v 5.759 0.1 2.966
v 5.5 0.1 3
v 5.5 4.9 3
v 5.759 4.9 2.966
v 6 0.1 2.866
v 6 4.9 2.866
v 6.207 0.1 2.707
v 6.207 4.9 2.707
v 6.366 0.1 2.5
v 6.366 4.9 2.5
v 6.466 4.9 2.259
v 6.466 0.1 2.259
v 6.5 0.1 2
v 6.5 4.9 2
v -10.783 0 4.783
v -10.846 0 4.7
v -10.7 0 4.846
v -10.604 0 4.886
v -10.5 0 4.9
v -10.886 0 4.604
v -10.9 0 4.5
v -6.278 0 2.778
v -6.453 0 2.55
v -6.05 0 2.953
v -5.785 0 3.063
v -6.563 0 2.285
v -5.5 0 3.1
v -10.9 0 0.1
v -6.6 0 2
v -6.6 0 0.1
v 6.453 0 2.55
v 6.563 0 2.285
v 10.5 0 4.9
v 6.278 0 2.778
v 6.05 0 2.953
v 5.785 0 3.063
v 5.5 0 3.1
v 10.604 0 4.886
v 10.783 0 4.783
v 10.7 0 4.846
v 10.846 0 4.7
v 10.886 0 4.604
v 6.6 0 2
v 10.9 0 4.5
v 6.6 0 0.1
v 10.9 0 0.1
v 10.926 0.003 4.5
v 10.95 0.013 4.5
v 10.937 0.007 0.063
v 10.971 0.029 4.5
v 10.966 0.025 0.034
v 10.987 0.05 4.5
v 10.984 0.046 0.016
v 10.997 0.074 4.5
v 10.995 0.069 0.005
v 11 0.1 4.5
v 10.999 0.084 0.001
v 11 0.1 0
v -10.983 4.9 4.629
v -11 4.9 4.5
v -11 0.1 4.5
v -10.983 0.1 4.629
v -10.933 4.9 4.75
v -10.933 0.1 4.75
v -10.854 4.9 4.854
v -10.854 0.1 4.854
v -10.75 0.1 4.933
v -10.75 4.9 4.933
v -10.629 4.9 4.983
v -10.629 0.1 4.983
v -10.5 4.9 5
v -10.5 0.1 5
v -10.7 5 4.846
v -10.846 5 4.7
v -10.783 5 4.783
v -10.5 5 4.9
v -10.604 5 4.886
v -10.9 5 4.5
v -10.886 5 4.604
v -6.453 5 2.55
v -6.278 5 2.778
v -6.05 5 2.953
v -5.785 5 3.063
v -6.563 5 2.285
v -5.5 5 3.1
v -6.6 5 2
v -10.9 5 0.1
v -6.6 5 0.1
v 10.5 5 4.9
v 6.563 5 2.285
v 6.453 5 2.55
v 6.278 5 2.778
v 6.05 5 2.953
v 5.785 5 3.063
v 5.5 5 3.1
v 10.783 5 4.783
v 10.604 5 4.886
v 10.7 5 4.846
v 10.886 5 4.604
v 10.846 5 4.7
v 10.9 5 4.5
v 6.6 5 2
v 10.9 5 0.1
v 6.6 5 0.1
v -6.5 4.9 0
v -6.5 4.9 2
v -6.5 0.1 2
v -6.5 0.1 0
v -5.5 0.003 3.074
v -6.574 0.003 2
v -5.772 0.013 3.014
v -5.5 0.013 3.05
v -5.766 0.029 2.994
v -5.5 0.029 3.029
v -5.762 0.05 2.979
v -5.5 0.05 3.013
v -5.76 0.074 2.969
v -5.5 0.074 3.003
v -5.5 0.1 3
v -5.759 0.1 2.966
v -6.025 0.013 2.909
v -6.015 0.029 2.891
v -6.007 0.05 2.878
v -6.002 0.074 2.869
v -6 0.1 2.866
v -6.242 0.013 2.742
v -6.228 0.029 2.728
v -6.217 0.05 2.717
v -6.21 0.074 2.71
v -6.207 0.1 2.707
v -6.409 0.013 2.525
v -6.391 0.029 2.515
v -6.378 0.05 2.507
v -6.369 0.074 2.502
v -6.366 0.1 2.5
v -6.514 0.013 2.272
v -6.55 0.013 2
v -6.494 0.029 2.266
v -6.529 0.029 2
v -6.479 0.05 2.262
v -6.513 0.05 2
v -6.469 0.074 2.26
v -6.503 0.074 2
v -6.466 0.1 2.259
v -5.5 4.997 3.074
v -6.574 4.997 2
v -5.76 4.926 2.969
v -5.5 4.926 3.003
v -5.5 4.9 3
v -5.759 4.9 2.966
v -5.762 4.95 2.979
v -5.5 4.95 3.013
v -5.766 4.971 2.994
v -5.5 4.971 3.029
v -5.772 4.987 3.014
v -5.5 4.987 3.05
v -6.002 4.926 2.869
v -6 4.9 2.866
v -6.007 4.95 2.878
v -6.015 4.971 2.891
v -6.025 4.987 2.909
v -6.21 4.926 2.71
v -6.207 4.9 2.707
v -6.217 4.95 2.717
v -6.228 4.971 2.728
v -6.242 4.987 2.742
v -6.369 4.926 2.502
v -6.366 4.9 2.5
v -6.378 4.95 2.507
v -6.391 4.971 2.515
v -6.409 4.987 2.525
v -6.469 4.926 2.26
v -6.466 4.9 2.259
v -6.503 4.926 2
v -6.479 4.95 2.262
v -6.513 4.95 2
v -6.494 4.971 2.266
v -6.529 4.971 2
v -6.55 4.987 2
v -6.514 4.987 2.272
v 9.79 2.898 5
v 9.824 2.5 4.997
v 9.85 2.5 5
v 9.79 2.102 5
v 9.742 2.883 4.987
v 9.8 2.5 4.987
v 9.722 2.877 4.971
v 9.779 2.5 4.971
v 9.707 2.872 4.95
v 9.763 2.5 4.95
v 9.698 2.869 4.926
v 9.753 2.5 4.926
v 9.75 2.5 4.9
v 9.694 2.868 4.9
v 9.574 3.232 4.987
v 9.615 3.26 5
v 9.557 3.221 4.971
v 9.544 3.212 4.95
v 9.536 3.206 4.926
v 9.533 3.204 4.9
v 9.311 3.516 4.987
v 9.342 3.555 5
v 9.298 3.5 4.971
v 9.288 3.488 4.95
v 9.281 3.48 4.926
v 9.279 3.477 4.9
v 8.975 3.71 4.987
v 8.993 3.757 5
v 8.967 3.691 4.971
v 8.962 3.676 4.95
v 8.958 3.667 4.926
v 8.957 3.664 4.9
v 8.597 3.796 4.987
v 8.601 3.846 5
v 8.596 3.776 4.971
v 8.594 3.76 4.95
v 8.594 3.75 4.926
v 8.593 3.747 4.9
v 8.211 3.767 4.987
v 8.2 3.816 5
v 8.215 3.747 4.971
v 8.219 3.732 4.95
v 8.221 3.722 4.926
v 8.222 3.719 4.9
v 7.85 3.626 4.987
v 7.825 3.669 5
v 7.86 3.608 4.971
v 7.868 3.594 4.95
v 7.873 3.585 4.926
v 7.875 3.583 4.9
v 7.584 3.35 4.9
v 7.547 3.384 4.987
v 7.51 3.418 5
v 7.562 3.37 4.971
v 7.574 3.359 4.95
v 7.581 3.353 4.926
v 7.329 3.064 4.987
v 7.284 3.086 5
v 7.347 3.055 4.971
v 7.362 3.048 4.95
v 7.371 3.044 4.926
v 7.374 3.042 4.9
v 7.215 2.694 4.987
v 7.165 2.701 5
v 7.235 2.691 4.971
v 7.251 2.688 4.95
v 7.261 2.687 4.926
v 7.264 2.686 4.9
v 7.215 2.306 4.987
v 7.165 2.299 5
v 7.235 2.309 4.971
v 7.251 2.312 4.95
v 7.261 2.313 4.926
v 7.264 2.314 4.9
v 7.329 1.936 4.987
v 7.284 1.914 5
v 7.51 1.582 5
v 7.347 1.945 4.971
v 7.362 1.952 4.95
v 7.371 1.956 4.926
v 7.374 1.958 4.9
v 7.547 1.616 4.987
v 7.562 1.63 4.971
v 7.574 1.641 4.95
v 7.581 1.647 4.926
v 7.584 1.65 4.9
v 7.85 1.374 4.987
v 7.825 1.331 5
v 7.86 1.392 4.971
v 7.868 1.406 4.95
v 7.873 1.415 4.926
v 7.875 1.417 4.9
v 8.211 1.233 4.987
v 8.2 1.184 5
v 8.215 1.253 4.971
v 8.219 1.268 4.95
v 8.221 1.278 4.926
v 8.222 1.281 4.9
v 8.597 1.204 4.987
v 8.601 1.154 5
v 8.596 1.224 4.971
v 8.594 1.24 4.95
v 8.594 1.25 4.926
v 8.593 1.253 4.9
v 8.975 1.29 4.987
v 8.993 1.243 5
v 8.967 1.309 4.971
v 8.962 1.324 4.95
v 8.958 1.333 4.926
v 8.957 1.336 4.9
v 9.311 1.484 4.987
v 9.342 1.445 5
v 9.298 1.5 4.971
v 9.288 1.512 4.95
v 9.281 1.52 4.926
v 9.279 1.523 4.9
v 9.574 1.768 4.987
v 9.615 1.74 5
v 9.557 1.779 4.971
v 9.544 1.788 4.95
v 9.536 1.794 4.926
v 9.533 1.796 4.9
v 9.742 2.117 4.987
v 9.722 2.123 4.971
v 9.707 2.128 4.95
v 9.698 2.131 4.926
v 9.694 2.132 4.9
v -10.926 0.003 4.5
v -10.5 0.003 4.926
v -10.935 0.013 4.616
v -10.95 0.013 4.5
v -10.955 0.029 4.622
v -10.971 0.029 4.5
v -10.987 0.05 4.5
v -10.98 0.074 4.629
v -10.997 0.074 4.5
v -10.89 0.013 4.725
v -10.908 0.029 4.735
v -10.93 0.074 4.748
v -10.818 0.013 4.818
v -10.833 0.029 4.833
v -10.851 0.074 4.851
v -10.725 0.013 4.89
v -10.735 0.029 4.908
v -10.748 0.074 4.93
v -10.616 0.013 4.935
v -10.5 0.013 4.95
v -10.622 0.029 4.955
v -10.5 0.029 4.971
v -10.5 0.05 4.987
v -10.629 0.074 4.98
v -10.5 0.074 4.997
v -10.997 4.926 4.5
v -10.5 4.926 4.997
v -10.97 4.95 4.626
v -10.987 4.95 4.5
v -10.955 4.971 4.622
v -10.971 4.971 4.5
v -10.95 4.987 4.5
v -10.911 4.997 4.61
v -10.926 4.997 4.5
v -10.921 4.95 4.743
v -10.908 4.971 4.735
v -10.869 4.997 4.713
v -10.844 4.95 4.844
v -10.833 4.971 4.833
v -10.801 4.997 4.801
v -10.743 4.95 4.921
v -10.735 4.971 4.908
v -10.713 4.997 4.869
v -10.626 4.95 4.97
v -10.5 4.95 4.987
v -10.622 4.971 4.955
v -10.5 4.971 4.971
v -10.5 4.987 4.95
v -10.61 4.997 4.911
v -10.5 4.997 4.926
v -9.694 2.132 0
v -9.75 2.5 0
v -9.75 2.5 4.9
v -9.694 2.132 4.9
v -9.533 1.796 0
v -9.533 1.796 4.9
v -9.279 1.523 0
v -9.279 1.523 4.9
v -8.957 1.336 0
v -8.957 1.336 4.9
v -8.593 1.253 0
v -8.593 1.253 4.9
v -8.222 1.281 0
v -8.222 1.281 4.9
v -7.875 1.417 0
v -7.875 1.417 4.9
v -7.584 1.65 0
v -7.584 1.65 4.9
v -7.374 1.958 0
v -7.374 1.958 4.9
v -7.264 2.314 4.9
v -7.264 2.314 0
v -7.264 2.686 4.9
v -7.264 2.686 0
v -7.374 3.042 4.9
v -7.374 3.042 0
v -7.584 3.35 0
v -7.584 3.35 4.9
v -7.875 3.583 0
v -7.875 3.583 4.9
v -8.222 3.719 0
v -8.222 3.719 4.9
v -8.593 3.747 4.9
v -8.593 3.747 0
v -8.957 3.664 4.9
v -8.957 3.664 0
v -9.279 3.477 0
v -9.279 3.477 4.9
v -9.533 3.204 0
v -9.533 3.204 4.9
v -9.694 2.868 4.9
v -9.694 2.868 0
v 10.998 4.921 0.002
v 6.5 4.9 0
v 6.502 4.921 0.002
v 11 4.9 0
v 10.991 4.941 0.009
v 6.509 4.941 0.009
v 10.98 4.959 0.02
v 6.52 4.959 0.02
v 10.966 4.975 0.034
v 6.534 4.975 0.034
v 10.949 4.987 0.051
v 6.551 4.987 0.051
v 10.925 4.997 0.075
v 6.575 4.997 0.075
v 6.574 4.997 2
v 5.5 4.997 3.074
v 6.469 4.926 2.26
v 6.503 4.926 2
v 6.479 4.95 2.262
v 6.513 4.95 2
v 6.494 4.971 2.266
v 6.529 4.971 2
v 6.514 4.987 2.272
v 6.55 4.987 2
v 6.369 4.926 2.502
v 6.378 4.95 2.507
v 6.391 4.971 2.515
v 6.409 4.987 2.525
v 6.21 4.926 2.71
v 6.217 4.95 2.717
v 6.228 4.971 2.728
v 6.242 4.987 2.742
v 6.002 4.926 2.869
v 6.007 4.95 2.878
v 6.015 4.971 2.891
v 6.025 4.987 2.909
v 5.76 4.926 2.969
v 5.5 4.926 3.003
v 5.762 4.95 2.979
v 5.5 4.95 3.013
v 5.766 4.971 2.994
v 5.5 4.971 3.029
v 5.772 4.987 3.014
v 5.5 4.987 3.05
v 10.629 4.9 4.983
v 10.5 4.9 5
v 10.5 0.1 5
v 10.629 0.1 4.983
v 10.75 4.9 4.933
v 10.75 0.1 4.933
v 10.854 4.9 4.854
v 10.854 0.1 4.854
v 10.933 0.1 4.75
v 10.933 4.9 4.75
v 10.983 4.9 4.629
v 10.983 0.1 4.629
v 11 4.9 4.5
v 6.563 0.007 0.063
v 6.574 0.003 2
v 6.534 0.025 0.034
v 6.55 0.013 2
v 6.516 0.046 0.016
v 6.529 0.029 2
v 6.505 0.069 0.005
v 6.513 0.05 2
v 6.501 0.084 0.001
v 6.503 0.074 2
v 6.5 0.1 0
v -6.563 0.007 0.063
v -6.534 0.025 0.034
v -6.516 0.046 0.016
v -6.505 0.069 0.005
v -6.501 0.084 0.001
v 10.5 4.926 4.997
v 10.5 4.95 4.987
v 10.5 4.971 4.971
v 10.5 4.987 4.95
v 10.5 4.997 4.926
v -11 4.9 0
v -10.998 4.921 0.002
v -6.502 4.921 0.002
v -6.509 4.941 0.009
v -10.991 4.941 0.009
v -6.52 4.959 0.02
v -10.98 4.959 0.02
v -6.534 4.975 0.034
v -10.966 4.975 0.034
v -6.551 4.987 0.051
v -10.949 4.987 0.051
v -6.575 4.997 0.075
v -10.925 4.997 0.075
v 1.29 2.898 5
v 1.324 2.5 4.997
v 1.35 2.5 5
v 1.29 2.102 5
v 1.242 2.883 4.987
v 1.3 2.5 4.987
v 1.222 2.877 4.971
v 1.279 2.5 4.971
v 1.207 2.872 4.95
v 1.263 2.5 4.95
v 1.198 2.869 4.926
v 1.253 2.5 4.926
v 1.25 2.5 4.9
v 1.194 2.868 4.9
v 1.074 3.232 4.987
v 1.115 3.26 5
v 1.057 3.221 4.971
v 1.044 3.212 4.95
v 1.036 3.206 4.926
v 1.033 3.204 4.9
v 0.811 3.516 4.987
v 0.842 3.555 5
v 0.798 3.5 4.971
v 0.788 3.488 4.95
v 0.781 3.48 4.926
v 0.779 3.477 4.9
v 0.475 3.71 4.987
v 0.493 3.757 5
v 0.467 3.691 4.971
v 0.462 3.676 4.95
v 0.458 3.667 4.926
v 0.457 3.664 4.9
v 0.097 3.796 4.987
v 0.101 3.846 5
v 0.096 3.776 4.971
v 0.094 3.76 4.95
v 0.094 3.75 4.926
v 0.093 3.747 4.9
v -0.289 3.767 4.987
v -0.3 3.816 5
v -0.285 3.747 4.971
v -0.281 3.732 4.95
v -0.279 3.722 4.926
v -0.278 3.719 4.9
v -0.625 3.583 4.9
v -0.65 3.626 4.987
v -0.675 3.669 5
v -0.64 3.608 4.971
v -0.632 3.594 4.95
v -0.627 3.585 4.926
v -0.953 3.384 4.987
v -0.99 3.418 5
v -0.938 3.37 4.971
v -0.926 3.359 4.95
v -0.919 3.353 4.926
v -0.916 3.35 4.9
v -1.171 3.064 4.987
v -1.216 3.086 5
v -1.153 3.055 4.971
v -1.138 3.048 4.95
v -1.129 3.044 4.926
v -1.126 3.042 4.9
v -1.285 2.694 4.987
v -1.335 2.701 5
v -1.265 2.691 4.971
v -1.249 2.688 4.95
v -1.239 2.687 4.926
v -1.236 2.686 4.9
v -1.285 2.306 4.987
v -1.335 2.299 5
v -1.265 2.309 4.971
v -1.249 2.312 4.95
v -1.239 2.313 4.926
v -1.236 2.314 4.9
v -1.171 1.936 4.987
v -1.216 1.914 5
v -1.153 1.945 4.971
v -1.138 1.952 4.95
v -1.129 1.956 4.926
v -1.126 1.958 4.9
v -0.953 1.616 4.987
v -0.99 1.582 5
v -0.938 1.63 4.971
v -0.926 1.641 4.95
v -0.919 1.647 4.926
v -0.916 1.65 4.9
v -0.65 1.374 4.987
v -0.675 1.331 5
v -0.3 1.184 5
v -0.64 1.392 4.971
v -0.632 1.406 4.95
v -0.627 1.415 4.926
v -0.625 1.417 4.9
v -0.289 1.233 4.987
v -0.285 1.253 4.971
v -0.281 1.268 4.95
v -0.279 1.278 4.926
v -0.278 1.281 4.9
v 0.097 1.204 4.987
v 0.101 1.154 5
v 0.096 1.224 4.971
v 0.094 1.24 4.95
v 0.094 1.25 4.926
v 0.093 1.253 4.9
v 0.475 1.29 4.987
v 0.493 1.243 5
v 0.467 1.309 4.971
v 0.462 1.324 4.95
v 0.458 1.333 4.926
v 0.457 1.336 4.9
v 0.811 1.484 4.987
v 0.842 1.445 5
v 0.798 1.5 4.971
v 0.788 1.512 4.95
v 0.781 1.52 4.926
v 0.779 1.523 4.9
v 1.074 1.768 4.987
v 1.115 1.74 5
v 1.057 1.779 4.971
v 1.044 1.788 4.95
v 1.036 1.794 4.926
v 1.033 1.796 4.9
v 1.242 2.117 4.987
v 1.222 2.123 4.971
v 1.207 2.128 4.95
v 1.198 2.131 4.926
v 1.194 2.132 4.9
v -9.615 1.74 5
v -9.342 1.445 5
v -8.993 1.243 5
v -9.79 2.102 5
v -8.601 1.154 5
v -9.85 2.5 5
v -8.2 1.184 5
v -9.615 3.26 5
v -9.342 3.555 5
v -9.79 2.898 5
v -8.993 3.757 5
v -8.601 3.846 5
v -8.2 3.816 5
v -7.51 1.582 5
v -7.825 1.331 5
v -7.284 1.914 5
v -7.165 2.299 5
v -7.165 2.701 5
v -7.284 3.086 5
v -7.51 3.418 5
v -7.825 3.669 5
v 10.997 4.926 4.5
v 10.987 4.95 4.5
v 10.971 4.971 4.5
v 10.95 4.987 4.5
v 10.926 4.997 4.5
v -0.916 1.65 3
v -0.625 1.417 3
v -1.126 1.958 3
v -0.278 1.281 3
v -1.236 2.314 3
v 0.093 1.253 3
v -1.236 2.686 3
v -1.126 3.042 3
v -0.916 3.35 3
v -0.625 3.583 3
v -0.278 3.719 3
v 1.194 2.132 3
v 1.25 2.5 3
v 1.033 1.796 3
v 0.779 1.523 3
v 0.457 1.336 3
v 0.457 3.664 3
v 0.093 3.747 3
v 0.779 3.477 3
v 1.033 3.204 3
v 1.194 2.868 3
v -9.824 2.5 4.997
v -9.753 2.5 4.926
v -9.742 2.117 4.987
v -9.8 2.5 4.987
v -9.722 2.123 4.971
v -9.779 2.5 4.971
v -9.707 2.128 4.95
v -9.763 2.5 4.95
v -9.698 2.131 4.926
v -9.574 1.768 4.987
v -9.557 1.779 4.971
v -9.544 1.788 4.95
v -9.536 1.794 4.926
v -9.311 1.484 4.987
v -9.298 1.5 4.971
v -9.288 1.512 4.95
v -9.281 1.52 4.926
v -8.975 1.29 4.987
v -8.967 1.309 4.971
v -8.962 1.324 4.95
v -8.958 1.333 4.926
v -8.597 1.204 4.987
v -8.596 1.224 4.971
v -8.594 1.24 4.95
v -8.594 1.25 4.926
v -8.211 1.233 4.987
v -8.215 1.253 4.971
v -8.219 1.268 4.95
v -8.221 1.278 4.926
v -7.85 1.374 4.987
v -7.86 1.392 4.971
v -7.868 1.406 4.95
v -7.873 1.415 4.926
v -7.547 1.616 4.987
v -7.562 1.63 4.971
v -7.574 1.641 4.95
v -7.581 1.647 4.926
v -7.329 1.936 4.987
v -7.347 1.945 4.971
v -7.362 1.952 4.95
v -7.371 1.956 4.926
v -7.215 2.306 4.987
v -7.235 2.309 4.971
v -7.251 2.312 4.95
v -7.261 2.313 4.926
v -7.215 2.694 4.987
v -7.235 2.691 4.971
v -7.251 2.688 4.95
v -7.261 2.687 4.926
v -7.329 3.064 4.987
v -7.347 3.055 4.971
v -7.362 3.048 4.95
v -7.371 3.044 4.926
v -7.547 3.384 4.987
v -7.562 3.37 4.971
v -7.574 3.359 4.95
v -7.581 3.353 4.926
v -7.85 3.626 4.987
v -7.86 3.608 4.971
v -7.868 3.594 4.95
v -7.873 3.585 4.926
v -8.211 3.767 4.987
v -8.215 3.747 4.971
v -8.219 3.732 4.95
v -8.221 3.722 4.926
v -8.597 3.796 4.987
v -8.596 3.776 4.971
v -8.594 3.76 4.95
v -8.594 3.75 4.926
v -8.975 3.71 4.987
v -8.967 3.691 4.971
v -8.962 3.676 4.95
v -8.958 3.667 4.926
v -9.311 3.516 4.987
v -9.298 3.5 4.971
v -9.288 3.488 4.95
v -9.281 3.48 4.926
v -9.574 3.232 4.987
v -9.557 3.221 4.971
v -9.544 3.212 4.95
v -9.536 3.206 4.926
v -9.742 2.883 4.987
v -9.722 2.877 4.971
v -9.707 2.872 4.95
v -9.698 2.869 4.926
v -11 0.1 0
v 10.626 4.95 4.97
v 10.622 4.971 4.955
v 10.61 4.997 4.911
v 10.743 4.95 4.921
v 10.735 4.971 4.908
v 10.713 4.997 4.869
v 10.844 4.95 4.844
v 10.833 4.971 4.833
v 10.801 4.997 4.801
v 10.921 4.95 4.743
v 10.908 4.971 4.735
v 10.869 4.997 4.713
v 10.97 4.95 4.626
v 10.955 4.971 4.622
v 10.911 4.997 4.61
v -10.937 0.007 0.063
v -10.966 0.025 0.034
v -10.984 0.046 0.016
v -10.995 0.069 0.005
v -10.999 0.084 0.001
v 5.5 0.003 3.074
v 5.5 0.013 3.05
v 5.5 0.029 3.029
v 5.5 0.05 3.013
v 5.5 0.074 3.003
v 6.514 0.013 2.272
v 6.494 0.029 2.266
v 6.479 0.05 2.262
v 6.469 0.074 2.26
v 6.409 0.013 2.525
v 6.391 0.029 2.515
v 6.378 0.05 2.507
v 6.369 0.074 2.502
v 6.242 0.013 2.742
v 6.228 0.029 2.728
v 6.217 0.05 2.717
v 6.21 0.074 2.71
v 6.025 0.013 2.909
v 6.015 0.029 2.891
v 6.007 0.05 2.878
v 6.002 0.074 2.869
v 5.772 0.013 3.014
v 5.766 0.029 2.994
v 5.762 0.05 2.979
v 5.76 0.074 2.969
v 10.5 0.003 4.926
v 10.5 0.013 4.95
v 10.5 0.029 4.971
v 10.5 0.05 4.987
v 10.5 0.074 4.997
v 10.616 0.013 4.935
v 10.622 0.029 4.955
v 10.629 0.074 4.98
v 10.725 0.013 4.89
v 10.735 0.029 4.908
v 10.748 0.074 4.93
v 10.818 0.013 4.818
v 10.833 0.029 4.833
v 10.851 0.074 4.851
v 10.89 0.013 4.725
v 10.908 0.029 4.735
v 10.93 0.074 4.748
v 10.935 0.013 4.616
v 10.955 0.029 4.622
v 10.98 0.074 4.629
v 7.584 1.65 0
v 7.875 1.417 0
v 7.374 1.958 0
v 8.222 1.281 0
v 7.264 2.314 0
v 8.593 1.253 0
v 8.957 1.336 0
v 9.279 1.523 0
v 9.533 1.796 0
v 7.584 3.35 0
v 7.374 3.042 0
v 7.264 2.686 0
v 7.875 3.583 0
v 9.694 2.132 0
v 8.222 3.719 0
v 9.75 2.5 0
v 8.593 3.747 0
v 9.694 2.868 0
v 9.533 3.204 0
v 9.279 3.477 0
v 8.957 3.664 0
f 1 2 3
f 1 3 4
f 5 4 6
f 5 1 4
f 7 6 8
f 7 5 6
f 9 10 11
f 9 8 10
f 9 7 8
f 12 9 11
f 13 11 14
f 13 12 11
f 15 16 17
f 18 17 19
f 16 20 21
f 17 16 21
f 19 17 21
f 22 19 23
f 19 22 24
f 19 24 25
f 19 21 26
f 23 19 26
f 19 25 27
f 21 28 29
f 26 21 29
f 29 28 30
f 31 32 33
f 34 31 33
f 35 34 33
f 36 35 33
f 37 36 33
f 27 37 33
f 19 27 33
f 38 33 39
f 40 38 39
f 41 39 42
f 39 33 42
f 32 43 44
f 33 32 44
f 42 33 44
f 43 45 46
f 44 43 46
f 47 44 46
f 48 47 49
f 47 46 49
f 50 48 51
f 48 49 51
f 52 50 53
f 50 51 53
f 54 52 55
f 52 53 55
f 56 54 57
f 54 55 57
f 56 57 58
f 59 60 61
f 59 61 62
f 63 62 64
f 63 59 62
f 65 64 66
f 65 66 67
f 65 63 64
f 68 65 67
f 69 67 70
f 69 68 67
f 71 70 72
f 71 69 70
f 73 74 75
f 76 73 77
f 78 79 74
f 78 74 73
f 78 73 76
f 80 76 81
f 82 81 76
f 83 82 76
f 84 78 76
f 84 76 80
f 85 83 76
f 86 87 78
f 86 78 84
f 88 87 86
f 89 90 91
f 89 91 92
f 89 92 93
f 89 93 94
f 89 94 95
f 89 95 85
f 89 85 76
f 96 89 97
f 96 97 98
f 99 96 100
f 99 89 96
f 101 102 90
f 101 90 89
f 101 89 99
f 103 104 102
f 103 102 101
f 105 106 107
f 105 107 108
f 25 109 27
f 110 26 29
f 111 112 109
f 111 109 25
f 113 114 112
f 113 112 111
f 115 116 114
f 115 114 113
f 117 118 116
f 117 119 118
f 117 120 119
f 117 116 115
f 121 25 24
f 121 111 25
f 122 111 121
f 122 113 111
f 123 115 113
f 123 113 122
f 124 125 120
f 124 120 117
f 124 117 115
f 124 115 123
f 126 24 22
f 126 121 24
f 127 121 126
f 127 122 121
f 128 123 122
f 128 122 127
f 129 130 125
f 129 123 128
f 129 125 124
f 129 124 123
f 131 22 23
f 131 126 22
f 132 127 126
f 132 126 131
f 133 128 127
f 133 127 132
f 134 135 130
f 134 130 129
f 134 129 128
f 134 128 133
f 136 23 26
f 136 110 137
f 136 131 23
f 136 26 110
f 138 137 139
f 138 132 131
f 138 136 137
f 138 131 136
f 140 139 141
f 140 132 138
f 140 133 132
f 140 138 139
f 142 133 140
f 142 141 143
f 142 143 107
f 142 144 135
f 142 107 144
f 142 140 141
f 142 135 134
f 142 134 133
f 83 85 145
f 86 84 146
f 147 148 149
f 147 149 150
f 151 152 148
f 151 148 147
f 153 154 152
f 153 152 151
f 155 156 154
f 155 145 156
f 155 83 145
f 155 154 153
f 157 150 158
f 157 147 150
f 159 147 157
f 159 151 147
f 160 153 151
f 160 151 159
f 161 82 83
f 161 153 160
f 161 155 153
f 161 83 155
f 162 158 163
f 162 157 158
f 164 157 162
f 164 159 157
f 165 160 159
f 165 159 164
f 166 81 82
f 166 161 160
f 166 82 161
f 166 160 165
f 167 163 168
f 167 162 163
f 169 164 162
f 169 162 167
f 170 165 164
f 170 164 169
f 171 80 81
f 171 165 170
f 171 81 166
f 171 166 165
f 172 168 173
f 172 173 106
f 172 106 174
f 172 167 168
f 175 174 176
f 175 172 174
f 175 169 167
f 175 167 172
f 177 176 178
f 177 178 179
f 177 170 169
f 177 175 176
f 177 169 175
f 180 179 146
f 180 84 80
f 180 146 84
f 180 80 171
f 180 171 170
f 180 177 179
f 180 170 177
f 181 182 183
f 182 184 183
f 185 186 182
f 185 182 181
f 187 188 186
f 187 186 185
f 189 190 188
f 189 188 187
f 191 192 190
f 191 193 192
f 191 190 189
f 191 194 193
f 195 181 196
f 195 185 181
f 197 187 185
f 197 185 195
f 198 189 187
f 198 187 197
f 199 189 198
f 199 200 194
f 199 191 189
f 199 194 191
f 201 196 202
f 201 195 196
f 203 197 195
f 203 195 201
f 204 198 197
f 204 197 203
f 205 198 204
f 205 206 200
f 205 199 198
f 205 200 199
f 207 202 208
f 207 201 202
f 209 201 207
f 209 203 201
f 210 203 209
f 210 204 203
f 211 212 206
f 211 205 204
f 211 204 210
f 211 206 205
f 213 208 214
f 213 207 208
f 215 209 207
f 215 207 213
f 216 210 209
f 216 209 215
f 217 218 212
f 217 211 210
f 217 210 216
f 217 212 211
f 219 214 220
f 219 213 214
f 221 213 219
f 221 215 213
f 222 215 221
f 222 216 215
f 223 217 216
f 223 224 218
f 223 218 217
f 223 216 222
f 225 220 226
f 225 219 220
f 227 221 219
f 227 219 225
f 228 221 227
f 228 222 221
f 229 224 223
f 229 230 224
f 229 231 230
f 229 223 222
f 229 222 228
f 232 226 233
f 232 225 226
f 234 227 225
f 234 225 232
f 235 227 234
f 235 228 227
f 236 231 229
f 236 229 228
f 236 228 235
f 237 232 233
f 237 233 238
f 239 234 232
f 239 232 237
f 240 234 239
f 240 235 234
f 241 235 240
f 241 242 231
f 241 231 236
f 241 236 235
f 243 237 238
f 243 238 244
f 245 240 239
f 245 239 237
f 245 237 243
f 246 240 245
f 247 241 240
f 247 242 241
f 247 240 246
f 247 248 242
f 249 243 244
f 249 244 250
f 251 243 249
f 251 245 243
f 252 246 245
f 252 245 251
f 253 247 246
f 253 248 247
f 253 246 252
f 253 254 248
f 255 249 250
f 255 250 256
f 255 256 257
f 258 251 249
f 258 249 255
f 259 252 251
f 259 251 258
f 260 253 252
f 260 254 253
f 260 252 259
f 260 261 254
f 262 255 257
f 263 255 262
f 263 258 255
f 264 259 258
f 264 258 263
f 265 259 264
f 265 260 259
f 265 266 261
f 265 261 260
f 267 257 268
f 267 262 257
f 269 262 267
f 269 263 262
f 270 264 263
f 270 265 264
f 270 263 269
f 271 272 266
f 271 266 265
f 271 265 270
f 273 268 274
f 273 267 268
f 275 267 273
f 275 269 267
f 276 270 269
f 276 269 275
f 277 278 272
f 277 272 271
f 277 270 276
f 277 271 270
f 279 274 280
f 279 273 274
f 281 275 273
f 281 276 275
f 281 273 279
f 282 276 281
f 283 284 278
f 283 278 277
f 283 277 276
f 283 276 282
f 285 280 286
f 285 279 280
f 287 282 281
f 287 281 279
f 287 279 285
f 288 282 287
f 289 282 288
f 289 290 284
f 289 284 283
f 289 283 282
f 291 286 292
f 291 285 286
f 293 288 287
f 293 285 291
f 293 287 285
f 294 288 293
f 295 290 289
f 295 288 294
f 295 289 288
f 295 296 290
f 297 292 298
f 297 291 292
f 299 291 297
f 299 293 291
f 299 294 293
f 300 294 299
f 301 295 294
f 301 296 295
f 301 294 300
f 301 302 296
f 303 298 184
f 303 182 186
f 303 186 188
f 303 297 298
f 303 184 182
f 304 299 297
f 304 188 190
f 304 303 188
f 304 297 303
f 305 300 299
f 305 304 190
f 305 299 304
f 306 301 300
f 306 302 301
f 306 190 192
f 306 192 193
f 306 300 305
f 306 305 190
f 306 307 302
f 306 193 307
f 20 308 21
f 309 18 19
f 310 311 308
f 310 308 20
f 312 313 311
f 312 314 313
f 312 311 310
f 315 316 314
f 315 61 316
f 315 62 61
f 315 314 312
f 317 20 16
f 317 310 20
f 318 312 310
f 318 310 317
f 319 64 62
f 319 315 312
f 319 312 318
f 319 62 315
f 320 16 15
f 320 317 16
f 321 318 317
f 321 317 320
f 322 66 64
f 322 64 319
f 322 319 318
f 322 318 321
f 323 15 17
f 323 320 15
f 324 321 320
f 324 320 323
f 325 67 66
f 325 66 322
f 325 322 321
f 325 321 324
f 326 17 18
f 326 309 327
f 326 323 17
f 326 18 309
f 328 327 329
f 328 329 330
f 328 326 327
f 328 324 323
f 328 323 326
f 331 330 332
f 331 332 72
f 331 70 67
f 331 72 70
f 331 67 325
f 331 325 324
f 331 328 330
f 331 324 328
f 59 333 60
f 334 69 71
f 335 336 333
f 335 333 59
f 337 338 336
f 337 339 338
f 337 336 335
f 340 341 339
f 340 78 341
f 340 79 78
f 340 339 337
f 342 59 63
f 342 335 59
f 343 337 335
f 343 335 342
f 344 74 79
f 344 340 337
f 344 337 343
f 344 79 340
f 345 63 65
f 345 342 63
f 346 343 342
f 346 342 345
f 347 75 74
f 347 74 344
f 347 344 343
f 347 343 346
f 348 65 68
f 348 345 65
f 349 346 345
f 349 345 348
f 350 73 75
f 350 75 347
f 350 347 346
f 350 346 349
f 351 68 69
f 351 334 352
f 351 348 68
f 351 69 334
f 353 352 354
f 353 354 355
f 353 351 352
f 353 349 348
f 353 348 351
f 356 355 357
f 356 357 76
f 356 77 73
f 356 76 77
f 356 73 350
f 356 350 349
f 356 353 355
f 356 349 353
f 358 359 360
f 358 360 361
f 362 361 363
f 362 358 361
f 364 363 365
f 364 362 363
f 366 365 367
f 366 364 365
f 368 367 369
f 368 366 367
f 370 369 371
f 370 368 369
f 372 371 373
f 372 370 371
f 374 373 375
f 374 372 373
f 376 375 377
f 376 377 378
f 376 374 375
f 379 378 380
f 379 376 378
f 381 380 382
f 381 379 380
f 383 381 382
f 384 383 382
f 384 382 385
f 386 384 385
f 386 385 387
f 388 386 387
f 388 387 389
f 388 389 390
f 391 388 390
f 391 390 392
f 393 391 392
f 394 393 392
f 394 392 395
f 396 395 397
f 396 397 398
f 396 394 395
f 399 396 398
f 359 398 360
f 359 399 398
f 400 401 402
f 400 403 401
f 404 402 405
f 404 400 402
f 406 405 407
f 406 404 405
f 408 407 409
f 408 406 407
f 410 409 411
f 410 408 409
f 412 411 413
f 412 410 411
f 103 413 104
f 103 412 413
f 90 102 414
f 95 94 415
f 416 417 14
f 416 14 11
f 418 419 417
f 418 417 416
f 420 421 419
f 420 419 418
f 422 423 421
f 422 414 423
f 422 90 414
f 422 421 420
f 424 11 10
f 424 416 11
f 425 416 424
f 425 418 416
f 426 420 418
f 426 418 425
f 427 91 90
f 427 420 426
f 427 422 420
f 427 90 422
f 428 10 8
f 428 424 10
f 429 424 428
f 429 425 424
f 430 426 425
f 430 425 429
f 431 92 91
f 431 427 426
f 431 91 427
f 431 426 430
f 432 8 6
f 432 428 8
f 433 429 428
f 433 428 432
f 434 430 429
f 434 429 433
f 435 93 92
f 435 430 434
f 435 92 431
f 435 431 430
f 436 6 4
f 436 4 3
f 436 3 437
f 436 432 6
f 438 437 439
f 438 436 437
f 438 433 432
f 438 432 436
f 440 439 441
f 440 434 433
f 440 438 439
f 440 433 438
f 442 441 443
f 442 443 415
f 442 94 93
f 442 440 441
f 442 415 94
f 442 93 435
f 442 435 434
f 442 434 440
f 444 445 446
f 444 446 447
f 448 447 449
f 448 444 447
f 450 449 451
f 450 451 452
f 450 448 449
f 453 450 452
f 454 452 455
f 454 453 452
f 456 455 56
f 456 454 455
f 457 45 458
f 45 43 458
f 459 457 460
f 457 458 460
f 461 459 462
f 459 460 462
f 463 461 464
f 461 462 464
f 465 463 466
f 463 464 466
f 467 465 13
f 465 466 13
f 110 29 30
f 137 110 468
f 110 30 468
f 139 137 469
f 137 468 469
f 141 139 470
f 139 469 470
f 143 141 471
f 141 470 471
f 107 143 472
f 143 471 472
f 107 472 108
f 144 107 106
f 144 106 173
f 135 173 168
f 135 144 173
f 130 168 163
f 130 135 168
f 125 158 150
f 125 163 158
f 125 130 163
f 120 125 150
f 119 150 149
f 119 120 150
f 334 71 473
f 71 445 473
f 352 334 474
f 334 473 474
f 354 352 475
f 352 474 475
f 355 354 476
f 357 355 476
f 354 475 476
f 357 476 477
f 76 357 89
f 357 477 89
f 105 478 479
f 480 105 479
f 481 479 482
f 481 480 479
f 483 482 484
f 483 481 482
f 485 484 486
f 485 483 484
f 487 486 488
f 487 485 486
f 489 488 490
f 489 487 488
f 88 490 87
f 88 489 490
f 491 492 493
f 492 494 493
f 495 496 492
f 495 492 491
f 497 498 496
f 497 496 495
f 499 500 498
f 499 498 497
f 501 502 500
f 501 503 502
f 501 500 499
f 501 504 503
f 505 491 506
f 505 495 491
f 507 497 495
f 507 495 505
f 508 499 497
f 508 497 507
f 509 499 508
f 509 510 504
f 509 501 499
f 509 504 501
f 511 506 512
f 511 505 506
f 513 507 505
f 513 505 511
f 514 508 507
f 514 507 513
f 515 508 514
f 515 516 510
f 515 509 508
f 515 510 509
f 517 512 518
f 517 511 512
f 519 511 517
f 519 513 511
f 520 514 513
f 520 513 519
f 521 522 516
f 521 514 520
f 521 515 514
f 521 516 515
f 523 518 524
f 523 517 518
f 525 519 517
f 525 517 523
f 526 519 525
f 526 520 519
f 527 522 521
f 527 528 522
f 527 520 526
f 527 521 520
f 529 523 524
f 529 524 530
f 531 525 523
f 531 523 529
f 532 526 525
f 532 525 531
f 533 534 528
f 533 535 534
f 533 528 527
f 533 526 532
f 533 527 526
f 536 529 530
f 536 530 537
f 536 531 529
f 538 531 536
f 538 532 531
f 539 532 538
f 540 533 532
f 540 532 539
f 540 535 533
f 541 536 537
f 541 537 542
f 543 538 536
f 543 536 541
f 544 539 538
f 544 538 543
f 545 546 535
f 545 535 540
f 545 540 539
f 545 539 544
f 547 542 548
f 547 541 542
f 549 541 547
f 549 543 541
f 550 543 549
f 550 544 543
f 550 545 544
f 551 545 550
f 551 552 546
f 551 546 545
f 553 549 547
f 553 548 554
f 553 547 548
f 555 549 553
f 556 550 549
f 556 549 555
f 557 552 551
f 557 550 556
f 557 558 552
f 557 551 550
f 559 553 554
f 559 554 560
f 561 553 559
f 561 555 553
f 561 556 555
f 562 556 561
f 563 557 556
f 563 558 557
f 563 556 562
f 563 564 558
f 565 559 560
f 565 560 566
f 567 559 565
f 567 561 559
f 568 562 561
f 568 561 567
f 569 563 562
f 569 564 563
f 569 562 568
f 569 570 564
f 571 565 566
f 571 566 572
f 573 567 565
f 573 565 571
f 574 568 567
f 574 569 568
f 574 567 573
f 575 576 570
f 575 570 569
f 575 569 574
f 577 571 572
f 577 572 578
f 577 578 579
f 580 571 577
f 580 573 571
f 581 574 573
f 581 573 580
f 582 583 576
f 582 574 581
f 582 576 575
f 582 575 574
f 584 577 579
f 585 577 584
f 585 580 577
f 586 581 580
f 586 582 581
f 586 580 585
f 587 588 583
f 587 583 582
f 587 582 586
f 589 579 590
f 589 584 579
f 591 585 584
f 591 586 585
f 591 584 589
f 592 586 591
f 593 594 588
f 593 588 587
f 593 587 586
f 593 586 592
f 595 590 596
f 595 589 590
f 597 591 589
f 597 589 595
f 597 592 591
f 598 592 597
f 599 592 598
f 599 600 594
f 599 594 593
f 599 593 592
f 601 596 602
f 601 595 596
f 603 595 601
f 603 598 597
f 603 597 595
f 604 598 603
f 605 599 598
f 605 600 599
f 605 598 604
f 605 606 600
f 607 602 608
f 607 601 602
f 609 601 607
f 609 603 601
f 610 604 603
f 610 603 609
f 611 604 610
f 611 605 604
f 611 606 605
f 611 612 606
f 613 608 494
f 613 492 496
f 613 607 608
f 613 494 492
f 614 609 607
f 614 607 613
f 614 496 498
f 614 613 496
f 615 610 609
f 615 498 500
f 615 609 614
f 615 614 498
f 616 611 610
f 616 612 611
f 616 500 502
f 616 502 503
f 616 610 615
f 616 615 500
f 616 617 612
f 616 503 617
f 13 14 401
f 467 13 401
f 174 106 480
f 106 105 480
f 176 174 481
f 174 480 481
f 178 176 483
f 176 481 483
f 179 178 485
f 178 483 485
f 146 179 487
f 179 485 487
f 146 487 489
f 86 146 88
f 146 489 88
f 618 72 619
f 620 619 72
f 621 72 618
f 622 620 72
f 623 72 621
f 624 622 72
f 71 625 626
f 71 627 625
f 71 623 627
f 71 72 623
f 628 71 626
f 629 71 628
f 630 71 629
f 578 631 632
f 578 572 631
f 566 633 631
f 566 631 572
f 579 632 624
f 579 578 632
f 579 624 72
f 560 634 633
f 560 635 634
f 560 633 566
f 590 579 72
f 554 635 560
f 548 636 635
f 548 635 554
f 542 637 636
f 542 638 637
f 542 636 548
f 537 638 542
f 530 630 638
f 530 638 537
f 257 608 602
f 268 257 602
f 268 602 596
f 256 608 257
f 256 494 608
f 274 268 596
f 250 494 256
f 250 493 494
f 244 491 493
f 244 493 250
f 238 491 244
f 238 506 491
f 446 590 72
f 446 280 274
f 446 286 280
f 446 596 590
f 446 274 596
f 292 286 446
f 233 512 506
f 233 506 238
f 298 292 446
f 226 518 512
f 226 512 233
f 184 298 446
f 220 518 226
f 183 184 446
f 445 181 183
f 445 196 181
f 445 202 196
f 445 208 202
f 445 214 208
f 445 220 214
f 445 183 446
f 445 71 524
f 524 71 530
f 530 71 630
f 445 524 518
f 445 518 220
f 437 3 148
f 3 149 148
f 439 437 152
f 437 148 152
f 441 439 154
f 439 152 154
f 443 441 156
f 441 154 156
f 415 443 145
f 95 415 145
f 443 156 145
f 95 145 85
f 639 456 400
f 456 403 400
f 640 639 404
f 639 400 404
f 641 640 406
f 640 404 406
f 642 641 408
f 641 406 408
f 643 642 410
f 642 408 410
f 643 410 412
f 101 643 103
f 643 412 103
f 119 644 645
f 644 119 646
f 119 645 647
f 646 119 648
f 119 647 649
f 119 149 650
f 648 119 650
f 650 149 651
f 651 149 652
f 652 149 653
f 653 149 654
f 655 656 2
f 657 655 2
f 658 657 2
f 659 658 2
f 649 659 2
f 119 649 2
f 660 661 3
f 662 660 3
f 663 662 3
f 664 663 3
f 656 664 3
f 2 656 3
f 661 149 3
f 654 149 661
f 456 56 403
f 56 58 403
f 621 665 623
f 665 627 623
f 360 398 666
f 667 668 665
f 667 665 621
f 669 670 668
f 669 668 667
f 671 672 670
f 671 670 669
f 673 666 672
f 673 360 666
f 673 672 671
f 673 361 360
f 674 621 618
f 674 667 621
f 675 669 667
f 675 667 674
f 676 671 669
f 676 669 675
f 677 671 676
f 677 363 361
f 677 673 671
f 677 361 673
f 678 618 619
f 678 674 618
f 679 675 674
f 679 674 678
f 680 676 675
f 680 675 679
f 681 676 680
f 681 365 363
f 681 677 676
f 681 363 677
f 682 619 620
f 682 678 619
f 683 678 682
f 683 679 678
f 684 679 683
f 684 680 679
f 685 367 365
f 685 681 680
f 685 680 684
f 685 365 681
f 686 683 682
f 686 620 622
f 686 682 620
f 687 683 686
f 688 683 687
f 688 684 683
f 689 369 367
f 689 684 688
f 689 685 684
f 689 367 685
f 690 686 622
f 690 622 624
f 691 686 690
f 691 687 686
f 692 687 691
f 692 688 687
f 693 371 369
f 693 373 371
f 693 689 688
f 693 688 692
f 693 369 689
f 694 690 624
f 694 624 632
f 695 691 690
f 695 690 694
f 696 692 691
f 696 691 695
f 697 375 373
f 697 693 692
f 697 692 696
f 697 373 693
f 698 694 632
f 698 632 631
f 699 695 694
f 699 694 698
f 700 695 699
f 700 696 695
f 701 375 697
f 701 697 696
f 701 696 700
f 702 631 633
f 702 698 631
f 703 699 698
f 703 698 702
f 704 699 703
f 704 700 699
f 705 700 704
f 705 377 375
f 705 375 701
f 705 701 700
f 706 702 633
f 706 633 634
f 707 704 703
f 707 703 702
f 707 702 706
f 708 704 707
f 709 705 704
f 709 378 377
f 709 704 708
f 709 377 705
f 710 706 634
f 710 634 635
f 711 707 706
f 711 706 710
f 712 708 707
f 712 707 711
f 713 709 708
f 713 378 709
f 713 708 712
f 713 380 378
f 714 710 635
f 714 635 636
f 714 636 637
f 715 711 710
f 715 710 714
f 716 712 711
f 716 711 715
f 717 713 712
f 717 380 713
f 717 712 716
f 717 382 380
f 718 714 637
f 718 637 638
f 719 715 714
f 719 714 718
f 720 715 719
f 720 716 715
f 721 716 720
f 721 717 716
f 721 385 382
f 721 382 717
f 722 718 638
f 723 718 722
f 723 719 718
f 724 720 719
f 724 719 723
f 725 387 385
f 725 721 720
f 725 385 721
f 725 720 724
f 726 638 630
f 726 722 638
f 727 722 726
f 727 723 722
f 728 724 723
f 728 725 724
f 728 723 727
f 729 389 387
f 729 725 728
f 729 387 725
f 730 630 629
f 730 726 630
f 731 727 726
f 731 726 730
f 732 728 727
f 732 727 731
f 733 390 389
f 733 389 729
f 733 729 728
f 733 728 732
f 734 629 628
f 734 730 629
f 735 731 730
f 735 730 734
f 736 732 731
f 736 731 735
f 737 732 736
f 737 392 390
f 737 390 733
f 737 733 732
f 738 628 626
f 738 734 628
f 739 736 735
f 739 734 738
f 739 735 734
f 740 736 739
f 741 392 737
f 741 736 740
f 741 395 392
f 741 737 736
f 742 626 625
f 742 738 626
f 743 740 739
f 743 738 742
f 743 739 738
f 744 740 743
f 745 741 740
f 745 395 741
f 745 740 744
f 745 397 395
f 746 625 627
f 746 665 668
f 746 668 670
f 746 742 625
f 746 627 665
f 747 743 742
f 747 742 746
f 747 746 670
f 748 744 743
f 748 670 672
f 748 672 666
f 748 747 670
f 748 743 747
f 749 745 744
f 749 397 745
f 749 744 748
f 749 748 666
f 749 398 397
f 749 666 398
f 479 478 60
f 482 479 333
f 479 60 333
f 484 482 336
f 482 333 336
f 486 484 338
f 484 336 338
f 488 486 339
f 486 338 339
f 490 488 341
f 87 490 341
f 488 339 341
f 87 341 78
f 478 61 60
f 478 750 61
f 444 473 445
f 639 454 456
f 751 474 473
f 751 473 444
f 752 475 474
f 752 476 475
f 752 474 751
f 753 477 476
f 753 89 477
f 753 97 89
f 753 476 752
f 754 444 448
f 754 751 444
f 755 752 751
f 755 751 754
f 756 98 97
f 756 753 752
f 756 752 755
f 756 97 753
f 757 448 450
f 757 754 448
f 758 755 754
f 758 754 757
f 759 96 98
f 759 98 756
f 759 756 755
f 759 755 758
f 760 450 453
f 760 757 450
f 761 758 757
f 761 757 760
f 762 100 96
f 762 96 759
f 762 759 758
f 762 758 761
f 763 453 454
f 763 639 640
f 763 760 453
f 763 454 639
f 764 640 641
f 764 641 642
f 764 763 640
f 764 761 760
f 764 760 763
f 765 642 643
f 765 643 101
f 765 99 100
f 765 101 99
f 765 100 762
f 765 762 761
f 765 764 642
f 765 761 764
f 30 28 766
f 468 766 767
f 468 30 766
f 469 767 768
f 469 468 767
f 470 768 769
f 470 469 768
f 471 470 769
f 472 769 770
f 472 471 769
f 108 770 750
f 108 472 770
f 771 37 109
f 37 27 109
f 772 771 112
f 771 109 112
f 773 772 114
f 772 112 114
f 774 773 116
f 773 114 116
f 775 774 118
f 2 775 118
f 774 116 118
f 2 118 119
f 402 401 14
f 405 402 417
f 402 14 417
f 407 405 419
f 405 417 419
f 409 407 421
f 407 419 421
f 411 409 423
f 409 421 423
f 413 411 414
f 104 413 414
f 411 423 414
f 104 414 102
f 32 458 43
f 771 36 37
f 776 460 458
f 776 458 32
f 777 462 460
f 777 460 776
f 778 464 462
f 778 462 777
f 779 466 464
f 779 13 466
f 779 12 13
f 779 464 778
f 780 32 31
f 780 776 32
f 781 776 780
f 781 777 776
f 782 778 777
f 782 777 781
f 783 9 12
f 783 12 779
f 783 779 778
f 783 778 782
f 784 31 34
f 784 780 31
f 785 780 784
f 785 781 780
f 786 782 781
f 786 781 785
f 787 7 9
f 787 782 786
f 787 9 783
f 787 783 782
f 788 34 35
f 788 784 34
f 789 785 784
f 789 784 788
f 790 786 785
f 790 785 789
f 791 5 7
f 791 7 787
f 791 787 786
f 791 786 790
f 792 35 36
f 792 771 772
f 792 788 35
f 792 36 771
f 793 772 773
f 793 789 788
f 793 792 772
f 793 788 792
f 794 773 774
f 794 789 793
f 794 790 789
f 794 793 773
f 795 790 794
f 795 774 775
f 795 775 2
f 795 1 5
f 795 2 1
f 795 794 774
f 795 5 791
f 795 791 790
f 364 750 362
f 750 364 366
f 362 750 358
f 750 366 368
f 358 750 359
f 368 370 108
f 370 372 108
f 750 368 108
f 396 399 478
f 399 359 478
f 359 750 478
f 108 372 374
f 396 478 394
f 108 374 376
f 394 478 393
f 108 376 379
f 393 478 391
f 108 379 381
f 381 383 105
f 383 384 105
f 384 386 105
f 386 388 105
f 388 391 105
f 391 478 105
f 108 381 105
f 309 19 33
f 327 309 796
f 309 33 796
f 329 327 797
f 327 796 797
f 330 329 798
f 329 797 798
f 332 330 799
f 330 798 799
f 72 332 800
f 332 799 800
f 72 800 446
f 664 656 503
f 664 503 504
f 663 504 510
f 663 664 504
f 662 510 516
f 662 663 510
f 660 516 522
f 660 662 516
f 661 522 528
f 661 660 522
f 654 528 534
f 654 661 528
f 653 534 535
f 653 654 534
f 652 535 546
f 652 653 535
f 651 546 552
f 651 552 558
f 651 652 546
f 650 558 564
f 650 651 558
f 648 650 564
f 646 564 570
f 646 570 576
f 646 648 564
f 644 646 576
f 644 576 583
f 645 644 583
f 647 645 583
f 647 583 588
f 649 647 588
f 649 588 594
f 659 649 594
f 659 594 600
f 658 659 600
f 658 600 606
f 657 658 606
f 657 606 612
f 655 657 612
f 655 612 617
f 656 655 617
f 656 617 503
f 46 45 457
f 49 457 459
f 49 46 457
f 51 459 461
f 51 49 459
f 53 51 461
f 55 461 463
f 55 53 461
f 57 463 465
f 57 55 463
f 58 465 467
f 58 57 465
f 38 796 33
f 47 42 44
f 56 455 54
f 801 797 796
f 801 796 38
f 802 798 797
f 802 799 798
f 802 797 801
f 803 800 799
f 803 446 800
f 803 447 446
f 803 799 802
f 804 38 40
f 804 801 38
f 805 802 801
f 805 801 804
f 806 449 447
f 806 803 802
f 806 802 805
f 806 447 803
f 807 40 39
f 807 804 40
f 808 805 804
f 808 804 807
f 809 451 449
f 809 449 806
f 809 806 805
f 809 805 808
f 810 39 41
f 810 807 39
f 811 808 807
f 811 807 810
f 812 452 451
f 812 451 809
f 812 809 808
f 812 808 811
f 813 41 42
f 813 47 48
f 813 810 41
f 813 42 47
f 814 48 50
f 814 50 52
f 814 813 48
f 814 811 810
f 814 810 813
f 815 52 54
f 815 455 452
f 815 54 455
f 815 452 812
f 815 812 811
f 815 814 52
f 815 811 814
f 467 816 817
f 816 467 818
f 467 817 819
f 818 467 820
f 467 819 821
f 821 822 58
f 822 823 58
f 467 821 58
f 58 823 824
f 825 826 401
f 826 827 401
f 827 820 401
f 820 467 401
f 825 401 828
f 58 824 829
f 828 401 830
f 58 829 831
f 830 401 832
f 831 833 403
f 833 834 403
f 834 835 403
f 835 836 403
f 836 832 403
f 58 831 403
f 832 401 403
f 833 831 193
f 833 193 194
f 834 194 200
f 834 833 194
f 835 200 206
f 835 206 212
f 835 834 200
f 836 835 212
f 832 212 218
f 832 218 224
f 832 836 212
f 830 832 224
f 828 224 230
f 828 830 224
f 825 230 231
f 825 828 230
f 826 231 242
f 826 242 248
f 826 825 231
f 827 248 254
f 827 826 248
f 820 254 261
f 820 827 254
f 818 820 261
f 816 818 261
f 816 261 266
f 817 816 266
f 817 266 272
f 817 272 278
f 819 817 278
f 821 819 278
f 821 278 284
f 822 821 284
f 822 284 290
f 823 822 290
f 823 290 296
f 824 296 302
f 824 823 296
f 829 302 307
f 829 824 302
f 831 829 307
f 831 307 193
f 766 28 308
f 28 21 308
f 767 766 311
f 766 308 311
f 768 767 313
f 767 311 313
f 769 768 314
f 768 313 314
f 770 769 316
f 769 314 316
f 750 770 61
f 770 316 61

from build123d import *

# Parameters (mm, degrees)
SKETCH1_W           = 22
SKETCH1_H           = 5
SKETCH1_R           = 1.25
BOSS_EXTRUDE1_DEPTH = 5
SKETCH2_W           = 13
SKETCH2_H           = 3
CUT_EXTRUDE1_DEPTH  = 14.076696831
FILLET1_R           = 1
FILLET2_R           = 0.5
FILLET3_R           = 0.1


with BuildPart() as part:
    # Sketch1 → Boss-Extrude1 (new body)
    with BuildSketch(Plane.XY):
        with Locations((0, 2.5)):
            Rectangle(SKETCH1_W, SKETCH1_H)
        with Locations((8.5, 2.5)):
            Circle(SKETCH1_R, mode=Mode.SUBTRACT)
        with Locations((0, 2.5)):
            Circle(SKETCH1_R, mode=Mode.SUBTRACT)
        with Locations((-8.5, 2.5)):
            Circle(SKETCH1_R, mode=Mode.SUBTRACT)
    extrude(amount=BOSS_EXTRUDE1_DEPTH)

    # Sketch2 → Cut-Extrude1 (cut, through all)
    with BuildSketch(Plane(origin=(0, 5, 0), x_dir=(1, 0, 0), z_dir=(0, 1, 0))):
        with Locations((0, -1.5)):
            Rectangle(SKETCH2_W, SKETCH2_H)
    extrude(amount=-CUT_EXTRUDE1_DEPTH, mode=Mode.SUBTRACT)

    # Fillet1
    fillet1_edges = [part.edges().sort_by_distance(p)[0] for p in [
        (6.5, 2.5, 3),
        (-6.5, 2.5, 3),
    ]]
    fillet(fillet1_edges, radius=FILLET1_R)

    # Fillet2
    fillet2_edges = [part.edges().sort_by_distance(p)[0] for p in [
        (-11, 2.5, 5),
        (11, 2.5, 5),
    ]]
    fillet(fillet2_edges, radius=FILLET2_R)

    # Fillet3
    fillet3_edges = [part.edges().sort_by_distance(p)[0] for p in [
        (10.853553391, 0, 4.853553391),
        (11, 0, 2.25),
        (8.75, 0, 0),
        (6.5, 0, 1),
        (6.207106781, 0, 2.707106781),
        (0, 0, 3),
        (-6.207106781, 0, 2.707106781),
        (-6.5, 0, 1),
        (-8.75, 0, 0),
        (-11, 0, 2.25),
        (-10.853553391, 0, 4.853553391),
        (-1.25, 2.5, 5),
        (-9.75, 2.5, 5),
        (0, 0, 5),
        (7.25, 2.5, 5),
        (-8.75, 5, 0),
        (-6.5, 5, 1),
        (-6.207106781, 5, 2.707106781),
        (0, 5, 3),
        (6.207106781, 5, 2.707106781),
        (6.5, 5, 1),
        (8.75, 5, 0),
        (11, 5, 2.25),
        (10.853553391, 5, 4.853553391),
        (0, 5, 5),
        (-10.853553391, 5, 4.853553391),
        (-11, 5, 2.25),
    ]]
    fillet(fillet3_edges, radius=FILLET3_R)


solid = part.part
